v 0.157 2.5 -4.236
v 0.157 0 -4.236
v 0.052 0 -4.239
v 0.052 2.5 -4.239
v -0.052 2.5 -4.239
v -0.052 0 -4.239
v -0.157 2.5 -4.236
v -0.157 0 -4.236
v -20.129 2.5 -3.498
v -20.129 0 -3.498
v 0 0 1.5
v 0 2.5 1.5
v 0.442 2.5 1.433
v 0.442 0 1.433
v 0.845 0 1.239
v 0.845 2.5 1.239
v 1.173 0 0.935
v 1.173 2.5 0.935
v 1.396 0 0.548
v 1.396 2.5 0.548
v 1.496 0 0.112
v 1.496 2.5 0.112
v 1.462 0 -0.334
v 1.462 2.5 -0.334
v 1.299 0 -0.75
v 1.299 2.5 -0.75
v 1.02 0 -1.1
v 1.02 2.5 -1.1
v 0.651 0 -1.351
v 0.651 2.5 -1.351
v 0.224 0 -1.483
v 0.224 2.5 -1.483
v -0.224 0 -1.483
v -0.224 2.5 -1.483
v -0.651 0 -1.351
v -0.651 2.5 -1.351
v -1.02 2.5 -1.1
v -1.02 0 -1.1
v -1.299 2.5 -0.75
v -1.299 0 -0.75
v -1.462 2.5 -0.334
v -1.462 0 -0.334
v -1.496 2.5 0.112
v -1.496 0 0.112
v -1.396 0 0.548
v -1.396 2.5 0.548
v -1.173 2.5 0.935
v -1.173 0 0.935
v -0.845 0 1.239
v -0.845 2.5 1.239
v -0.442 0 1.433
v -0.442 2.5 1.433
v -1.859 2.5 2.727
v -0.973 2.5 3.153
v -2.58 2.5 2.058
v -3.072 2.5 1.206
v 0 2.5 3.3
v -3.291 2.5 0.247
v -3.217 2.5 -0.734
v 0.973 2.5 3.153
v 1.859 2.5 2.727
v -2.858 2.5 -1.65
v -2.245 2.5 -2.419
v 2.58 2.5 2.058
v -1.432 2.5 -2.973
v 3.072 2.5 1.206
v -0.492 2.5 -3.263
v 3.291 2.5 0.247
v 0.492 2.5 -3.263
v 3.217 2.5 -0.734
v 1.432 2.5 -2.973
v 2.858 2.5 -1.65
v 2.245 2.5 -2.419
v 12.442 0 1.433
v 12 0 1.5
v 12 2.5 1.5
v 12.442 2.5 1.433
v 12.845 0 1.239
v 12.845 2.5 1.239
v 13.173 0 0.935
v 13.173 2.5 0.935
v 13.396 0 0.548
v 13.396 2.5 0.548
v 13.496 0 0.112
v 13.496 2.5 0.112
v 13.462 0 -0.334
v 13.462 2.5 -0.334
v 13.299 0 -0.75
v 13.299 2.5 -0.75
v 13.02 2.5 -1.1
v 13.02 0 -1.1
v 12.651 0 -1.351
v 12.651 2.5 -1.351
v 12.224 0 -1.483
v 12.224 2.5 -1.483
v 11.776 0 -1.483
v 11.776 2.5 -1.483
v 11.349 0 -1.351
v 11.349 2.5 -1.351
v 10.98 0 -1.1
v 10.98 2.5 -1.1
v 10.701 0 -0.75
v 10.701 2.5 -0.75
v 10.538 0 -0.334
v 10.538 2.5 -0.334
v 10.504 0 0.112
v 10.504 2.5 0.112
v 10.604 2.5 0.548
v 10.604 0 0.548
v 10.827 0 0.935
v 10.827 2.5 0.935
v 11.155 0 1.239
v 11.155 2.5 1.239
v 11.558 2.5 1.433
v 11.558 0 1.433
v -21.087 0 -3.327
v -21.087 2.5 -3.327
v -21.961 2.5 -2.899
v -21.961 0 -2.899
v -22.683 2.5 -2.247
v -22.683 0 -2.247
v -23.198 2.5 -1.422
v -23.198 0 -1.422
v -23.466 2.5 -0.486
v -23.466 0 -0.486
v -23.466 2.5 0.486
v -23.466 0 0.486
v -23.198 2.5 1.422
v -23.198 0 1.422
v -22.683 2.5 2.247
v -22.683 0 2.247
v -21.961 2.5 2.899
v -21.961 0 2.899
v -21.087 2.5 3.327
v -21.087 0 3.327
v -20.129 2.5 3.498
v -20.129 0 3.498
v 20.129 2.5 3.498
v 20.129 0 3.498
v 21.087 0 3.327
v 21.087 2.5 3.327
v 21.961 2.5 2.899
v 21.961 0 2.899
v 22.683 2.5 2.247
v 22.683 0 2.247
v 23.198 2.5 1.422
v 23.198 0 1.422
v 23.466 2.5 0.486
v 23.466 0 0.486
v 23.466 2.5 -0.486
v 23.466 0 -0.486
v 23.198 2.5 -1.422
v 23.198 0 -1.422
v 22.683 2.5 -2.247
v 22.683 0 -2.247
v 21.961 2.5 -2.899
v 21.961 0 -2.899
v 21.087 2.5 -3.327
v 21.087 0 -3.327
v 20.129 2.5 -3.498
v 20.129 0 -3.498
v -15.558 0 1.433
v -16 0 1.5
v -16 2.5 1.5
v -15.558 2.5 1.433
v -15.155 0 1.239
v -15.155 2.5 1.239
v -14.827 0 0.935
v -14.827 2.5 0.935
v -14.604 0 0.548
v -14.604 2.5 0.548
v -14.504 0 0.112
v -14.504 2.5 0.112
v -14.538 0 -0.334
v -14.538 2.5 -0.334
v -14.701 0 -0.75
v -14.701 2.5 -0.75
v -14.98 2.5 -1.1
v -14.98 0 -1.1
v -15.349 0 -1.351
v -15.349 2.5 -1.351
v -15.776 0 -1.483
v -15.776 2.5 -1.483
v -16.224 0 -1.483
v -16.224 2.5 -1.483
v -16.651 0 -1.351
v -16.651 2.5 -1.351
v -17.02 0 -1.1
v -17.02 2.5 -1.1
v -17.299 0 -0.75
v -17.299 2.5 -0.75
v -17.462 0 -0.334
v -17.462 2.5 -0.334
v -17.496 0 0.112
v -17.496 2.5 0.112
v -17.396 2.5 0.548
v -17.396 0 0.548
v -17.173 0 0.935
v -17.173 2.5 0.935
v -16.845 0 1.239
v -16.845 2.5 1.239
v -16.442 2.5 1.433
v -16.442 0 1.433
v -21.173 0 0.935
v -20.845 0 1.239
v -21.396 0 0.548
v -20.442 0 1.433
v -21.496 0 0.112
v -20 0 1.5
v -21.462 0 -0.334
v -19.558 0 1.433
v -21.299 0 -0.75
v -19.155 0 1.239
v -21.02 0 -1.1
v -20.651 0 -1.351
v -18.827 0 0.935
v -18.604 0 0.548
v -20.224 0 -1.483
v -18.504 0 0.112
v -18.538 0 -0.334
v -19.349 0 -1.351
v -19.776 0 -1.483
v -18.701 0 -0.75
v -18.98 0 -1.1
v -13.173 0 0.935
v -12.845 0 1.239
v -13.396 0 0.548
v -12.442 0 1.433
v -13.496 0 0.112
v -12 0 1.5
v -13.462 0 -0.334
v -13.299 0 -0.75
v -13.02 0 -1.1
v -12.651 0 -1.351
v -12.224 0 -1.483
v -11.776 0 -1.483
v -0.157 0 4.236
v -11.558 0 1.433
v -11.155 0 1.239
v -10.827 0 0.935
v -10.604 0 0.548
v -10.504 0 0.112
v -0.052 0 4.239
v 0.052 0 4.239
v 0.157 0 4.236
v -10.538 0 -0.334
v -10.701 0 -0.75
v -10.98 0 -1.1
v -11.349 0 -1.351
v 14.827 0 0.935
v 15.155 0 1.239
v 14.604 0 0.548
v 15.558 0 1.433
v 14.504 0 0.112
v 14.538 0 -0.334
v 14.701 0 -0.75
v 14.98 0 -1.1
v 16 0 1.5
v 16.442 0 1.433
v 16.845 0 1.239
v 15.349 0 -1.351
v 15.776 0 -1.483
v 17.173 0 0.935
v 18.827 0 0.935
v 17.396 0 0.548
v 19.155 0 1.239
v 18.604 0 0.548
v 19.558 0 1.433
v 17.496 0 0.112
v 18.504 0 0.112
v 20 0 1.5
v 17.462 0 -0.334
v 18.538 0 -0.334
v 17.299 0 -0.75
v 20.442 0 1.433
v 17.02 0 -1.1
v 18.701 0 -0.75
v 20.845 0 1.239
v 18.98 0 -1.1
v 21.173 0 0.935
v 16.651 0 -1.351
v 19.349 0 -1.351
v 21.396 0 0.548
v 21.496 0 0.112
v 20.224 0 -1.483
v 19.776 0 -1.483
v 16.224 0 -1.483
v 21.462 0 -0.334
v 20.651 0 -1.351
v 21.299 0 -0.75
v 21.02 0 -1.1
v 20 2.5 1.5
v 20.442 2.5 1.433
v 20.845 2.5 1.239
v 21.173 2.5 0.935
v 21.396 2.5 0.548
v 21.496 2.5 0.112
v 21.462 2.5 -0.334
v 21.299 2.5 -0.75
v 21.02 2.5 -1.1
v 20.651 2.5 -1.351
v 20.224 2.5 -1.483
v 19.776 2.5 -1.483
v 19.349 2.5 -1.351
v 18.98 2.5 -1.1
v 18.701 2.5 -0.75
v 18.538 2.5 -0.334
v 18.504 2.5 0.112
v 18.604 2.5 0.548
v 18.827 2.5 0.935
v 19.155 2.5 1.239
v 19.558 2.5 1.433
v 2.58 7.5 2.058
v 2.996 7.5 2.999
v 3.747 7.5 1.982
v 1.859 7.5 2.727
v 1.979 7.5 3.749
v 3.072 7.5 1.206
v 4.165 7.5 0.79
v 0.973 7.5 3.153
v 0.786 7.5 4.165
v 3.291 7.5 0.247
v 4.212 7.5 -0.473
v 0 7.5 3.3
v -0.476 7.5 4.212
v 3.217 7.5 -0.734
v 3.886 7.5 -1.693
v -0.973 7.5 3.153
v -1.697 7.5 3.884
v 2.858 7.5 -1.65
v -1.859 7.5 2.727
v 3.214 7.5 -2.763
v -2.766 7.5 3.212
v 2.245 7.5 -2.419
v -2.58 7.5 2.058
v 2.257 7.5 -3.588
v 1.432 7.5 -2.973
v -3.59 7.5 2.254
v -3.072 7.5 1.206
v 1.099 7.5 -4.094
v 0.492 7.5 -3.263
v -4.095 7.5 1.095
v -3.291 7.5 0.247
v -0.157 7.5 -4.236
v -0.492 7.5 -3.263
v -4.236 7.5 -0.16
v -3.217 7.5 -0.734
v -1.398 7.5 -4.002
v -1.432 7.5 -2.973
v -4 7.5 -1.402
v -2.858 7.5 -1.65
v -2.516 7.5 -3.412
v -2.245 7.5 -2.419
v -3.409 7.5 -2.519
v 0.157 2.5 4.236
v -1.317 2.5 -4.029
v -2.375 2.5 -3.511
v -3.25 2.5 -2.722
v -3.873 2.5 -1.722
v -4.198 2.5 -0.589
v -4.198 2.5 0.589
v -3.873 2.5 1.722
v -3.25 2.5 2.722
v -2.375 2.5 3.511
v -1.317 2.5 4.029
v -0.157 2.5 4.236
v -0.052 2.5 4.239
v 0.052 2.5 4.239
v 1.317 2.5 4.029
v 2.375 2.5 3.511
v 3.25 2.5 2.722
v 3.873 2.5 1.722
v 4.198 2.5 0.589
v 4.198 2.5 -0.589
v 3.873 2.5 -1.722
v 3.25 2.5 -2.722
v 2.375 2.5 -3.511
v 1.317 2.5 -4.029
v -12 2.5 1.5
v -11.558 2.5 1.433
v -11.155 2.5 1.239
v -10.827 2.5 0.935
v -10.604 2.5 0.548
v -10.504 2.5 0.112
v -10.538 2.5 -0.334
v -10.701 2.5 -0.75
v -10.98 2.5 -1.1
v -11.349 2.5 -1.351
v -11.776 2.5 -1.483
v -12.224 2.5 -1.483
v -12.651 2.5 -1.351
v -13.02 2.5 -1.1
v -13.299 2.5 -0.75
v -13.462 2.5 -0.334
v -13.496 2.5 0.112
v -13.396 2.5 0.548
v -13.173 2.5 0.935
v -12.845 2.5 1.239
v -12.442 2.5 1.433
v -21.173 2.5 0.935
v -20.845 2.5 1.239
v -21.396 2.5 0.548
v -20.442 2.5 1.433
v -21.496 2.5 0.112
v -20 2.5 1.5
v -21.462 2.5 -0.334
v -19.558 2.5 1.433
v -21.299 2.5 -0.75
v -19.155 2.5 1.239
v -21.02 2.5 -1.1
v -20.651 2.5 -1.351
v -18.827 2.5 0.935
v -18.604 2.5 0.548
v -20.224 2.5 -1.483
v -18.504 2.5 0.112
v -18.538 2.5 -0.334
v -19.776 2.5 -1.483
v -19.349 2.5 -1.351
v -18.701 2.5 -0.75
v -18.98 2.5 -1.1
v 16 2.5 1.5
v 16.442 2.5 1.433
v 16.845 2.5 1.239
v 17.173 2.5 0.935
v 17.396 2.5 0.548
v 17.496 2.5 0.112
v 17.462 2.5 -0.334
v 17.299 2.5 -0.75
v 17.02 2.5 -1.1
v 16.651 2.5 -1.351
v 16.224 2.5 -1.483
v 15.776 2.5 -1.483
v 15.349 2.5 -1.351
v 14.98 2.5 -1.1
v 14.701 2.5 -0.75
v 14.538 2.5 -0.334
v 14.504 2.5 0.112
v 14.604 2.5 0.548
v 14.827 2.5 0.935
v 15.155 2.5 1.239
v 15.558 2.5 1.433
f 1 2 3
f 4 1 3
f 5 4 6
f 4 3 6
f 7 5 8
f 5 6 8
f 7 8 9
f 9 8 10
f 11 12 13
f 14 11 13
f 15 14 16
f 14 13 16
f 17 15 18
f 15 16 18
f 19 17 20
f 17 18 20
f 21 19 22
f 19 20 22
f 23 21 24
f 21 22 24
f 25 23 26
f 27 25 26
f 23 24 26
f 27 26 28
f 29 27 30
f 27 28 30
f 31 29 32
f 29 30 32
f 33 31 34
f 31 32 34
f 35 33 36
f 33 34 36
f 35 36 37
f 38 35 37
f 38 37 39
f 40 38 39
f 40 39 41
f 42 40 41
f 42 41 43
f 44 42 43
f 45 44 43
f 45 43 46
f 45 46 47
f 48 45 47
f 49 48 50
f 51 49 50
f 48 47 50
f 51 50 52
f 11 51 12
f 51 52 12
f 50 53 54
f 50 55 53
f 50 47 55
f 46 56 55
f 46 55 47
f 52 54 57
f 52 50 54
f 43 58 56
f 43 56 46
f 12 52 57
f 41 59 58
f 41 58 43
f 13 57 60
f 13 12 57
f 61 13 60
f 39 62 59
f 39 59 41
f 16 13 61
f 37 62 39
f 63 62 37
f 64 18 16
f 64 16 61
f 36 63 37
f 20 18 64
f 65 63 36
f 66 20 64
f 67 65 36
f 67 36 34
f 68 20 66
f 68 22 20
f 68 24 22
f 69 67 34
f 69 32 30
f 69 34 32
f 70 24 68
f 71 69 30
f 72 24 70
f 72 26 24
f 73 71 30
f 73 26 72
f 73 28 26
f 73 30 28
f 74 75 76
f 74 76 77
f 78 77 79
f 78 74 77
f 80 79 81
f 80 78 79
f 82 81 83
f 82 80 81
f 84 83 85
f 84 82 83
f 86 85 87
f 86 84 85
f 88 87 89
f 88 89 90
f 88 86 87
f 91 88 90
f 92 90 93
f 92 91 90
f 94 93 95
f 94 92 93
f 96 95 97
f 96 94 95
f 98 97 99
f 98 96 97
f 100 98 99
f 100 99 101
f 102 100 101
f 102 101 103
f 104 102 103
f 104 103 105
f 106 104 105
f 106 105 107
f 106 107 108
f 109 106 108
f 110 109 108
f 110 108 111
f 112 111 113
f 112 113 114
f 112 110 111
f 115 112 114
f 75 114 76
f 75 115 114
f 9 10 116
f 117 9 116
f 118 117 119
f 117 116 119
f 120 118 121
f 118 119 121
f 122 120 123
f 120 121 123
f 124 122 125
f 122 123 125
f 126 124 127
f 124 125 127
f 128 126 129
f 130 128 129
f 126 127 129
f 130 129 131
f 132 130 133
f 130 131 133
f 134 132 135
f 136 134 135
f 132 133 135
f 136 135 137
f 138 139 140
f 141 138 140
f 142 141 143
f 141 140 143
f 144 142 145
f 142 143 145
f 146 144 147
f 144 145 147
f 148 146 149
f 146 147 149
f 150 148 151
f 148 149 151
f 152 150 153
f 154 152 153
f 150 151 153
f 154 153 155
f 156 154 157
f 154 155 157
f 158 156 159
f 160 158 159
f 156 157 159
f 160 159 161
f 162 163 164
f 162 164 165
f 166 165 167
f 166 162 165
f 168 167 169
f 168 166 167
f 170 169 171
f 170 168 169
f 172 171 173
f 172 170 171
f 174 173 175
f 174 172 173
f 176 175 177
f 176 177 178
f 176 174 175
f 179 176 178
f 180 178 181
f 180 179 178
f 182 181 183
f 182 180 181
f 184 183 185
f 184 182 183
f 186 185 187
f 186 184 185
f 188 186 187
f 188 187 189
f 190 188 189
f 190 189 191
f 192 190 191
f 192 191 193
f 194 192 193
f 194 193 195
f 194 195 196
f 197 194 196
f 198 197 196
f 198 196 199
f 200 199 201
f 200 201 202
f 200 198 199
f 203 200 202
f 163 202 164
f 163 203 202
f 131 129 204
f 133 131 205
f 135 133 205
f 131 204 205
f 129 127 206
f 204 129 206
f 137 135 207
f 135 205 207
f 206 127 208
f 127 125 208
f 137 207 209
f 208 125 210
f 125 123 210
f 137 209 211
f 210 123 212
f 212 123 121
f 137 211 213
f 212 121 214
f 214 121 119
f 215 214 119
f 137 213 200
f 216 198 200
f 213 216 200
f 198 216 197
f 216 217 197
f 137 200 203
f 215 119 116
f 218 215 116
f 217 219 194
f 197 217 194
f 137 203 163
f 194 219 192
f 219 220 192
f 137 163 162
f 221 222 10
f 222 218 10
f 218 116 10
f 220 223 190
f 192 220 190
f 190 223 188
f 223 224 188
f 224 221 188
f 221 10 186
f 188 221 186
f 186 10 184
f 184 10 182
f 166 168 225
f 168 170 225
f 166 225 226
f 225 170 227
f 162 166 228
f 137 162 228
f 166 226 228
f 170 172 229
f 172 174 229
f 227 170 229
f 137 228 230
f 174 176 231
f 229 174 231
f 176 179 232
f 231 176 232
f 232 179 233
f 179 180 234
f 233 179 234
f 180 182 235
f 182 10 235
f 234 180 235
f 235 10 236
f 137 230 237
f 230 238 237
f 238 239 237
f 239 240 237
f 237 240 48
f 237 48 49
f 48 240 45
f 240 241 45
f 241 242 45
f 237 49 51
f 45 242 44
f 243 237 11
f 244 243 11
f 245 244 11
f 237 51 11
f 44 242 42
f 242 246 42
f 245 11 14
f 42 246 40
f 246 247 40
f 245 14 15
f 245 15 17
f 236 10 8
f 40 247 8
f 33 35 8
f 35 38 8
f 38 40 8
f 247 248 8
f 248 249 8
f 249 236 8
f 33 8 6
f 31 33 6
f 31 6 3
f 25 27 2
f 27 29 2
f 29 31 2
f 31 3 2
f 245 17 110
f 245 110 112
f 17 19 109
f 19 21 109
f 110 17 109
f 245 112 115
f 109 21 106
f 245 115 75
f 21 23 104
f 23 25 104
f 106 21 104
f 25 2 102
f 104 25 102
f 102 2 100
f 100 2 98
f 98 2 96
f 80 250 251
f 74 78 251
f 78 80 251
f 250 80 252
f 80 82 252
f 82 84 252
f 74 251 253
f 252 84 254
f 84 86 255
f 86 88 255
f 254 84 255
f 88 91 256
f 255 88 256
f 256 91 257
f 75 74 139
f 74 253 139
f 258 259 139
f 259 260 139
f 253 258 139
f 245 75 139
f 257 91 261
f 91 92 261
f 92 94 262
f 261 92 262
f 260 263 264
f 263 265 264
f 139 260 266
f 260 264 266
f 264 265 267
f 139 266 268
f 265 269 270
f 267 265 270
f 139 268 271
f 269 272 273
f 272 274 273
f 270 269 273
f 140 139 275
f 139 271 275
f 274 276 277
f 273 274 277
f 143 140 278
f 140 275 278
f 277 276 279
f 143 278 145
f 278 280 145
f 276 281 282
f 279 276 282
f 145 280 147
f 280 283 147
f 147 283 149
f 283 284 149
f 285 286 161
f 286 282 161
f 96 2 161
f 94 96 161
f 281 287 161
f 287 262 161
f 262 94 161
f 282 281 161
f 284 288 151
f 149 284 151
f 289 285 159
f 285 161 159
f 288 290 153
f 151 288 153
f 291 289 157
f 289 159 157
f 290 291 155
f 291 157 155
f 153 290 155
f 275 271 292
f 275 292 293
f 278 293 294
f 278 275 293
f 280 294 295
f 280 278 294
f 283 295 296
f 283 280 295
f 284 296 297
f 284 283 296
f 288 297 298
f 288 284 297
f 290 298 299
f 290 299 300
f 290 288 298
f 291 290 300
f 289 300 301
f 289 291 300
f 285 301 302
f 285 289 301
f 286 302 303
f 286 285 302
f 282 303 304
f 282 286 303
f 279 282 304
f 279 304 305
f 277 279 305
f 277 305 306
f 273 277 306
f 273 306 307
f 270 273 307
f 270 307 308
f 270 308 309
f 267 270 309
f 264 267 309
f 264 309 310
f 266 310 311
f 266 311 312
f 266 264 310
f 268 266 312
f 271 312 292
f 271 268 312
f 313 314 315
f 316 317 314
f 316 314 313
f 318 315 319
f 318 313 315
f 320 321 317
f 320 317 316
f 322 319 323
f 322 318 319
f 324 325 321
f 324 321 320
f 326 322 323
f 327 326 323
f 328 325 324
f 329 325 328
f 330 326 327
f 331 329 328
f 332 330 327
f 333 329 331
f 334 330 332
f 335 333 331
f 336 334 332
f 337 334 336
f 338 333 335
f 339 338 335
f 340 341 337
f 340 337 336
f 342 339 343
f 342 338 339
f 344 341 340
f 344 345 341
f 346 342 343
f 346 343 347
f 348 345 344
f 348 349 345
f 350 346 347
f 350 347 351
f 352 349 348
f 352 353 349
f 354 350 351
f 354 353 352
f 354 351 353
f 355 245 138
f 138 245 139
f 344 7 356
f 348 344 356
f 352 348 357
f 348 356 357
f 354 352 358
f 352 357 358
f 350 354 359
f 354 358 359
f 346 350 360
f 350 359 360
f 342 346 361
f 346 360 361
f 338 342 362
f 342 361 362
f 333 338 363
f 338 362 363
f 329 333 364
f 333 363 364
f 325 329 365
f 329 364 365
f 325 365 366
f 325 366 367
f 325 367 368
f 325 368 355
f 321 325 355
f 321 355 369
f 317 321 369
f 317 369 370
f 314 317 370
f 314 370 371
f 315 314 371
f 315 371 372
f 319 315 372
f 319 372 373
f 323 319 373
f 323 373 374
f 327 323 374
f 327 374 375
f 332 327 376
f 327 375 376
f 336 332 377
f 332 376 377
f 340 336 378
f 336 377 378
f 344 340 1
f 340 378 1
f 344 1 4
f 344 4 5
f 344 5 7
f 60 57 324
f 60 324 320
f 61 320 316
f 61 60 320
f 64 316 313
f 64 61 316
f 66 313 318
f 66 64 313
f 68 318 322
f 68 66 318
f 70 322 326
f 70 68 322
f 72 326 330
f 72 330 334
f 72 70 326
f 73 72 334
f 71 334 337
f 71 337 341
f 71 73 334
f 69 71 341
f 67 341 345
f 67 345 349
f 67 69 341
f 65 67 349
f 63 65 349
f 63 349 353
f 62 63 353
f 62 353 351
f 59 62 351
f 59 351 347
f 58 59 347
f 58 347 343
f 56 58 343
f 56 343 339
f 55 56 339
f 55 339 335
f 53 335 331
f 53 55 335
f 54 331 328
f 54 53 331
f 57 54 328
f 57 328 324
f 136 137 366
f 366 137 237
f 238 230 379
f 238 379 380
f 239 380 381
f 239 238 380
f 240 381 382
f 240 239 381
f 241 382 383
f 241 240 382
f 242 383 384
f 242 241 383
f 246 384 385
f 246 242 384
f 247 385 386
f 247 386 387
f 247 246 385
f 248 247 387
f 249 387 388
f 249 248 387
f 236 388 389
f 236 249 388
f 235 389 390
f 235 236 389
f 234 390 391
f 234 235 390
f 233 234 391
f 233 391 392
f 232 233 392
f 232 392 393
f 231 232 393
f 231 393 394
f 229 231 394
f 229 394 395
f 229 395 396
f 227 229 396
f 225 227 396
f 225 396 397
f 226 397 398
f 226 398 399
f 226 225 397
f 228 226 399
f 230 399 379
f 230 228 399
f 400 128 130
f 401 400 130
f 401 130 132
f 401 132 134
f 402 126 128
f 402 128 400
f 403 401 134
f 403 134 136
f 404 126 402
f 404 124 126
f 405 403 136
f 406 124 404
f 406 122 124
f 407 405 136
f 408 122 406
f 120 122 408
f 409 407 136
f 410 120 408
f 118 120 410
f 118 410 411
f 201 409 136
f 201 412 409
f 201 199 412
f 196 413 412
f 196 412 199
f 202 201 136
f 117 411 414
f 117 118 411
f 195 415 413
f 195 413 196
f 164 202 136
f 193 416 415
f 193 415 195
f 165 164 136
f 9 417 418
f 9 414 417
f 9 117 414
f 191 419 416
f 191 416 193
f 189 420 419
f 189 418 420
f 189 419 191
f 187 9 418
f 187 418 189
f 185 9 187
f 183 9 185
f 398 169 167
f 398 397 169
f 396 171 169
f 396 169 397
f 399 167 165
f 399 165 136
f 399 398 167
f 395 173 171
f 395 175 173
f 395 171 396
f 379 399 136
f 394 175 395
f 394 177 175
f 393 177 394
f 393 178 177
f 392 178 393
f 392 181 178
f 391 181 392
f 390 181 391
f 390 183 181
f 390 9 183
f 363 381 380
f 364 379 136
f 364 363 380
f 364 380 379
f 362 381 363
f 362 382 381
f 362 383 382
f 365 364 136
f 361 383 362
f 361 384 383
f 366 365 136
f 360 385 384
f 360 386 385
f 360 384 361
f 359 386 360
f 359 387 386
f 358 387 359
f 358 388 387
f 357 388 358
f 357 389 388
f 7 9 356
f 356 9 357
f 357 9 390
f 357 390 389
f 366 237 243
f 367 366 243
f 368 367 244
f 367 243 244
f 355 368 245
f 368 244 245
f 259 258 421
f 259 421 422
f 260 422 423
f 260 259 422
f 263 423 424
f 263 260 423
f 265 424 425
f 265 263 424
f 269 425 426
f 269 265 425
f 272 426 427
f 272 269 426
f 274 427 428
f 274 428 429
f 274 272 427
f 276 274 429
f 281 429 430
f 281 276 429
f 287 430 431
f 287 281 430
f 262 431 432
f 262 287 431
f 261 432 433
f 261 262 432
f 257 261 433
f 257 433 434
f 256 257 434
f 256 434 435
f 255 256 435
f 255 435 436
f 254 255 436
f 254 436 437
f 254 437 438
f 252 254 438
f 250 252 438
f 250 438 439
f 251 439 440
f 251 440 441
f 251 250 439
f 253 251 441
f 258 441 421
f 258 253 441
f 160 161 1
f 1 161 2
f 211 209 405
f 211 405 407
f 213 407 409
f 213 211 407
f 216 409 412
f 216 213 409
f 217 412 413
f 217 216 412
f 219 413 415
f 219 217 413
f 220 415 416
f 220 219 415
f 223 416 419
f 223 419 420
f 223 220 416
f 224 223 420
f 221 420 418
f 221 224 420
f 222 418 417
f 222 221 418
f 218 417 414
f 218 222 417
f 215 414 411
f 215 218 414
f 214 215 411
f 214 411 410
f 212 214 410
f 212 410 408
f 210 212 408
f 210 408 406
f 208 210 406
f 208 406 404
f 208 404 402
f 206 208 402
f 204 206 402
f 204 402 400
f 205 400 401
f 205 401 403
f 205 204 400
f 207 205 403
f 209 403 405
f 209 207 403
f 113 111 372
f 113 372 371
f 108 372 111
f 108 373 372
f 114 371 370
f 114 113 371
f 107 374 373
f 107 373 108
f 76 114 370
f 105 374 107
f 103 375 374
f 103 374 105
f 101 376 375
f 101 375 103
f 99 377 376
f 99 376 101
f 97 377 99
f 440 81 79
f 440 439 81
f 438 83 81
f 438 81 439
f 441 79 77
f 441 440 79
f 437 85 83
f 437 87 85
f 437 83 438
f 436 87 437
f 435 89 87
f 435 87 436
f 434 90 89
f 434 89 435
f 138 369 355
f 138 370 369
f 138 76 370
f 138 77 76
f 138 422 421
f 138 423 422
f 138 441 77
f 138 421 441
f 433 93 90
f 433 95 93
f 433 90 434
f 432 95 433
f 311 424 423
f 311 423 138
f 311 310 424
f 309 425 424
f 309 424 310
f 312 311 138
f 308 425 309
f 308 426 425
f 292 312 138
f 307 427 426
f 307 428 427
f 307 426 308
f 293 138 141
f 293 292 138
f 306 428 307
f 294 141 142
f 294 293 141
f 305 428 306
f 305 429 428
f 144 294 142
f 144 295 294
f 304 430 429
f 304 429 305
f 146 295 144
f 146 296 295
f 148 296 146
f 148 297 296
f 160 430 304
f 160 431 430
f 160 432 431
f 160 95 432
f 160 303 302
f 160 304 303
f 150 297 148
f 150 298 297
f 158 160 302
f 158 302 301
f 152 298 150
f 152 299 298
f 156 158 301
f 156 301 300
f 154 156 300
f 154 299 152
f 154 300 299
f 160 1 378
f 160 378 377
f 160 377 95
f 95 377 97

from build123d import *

# Parameters (mm, degrees)
SKETCH_1_R      = 1.5
SKETCH_1_R_2    = 3.3
EXTRUDE_2_DEPTH = 2.5
SKETCH_2_R      = 4.238828267
SKETCH_2_R_2    = 3.3
EXTRUDE_3_DEPTH = 5
SKETCH_3_R      = 3.73192113
SKETCH_3_R_2    = 1.5
EXTRUDE_4_DEPTH = 2.5


with BuildPart() as part:
    # 草图1 → 凸台-拉伸2 (new body)
    with BuildSketch(Plane(origin=(0, 0, 0), x_dir=(1, 0, 0), z_dir=(0, 1, 0))):
        with BuildLine():
            Line((0.156588307, -4.235934983), (20.129294947, -3.497611016))
            ThreePointArc((20.129294947, -3.497611016), (23.5, 0), (20.129294947, 3.497611016))
            Line((20.129294947, 3.497611016), (0.156588307, 4.235934983))
            ThreePointArc((0.156588307, 4.235934983), (0, 4.238828267), (-0.156588307, 4.235934983))
            Line((-0.156588307, 4.235934983), (-20.129294947, 3.497611016))
            ThreePointArc((-20.129294947, 3.497611016), (-23.5, 0), (-20.129294947, -3.497611016))
            Line((-20.129294947, -3.497611016), (-0.156588307, -4.235934983))
            ThreePointArc((-0.156588307, -4.235934983), (0, -4.238828267), (0.156588307, -4.235934983))
        make_face()
        with Locations(Location((-20, 0, 0), (0, 0, 270))):
            Circle(SKETCH_1_R, mode=Mode.SUBTRACT)
        with Locations(Location((-16, 0, 0), (0, 0, 270))):
            Circle(SKETCH_1_R, mode=Mode.SUBTRACT)
        with Locations(Location((-12, 0, 0), (0, 0, 270))):
            Circle(SKETCH_1_R, mode=Mode.SUBTRACT)
        with Locations(Location((0, 0, 0), (0, 0, 270))):
            Circle(SKETCH_1_R_2, mode=Mode.SUBTRACT)
        with Locations(Location((12, 0, 0), (0, 0, 270))):
            Circle(SKETCH_1_R, mode=Mode.SUBTRACT)
        with Locations(Location((16, 0, 0), (0, 0, 270))):
            Circle(SKETCH_1_R, mode=Mode.SUBTRACT)
        with Locations(Location((20, 0, 0), (0, 0, 270))):
            Circle(SKETCH_1_R, mode=Mode.SUBTRACT)
    extrude(amount=EXTRUDE_2_DEPTH)

    # 草图2 → 凸台-拉伸3 (add)
    with BuildSketch(Plane(origin=(0, 2.5, 0), x_dir=(1, 0, 0), z_dir=(0, 1, 0))):
        with Locations(Location((0, 0, 0), (0, 0, 92.117068776))):
            Circle(SKETCH_2_R)
        with Locations(Location((0, 0, 0), (0, 0, 270))):
            Circle(SKETCH_2_R_2, mode=Mode.SUBTRACT)
    extrude(amount=EXTRUDE_3_DEPTH)

    # 草图3 → 凸台-拉伸4 (add)
    with BuildSketch(Plane(origin=(0, 2.5, 0), x_dir=(1, 0, 0), z_dir=(0, 1, 0))):
        Circle(SKETCH_3_R)
        with Locations(Location((0, 0, 0), (0, 0, 270))):
            Circle(SKETCH_3_R_2, mode=Mode.SUBTRACT)
    extrude(amount=-EXTRUDE_4_DEPTH)


solid = part.part
